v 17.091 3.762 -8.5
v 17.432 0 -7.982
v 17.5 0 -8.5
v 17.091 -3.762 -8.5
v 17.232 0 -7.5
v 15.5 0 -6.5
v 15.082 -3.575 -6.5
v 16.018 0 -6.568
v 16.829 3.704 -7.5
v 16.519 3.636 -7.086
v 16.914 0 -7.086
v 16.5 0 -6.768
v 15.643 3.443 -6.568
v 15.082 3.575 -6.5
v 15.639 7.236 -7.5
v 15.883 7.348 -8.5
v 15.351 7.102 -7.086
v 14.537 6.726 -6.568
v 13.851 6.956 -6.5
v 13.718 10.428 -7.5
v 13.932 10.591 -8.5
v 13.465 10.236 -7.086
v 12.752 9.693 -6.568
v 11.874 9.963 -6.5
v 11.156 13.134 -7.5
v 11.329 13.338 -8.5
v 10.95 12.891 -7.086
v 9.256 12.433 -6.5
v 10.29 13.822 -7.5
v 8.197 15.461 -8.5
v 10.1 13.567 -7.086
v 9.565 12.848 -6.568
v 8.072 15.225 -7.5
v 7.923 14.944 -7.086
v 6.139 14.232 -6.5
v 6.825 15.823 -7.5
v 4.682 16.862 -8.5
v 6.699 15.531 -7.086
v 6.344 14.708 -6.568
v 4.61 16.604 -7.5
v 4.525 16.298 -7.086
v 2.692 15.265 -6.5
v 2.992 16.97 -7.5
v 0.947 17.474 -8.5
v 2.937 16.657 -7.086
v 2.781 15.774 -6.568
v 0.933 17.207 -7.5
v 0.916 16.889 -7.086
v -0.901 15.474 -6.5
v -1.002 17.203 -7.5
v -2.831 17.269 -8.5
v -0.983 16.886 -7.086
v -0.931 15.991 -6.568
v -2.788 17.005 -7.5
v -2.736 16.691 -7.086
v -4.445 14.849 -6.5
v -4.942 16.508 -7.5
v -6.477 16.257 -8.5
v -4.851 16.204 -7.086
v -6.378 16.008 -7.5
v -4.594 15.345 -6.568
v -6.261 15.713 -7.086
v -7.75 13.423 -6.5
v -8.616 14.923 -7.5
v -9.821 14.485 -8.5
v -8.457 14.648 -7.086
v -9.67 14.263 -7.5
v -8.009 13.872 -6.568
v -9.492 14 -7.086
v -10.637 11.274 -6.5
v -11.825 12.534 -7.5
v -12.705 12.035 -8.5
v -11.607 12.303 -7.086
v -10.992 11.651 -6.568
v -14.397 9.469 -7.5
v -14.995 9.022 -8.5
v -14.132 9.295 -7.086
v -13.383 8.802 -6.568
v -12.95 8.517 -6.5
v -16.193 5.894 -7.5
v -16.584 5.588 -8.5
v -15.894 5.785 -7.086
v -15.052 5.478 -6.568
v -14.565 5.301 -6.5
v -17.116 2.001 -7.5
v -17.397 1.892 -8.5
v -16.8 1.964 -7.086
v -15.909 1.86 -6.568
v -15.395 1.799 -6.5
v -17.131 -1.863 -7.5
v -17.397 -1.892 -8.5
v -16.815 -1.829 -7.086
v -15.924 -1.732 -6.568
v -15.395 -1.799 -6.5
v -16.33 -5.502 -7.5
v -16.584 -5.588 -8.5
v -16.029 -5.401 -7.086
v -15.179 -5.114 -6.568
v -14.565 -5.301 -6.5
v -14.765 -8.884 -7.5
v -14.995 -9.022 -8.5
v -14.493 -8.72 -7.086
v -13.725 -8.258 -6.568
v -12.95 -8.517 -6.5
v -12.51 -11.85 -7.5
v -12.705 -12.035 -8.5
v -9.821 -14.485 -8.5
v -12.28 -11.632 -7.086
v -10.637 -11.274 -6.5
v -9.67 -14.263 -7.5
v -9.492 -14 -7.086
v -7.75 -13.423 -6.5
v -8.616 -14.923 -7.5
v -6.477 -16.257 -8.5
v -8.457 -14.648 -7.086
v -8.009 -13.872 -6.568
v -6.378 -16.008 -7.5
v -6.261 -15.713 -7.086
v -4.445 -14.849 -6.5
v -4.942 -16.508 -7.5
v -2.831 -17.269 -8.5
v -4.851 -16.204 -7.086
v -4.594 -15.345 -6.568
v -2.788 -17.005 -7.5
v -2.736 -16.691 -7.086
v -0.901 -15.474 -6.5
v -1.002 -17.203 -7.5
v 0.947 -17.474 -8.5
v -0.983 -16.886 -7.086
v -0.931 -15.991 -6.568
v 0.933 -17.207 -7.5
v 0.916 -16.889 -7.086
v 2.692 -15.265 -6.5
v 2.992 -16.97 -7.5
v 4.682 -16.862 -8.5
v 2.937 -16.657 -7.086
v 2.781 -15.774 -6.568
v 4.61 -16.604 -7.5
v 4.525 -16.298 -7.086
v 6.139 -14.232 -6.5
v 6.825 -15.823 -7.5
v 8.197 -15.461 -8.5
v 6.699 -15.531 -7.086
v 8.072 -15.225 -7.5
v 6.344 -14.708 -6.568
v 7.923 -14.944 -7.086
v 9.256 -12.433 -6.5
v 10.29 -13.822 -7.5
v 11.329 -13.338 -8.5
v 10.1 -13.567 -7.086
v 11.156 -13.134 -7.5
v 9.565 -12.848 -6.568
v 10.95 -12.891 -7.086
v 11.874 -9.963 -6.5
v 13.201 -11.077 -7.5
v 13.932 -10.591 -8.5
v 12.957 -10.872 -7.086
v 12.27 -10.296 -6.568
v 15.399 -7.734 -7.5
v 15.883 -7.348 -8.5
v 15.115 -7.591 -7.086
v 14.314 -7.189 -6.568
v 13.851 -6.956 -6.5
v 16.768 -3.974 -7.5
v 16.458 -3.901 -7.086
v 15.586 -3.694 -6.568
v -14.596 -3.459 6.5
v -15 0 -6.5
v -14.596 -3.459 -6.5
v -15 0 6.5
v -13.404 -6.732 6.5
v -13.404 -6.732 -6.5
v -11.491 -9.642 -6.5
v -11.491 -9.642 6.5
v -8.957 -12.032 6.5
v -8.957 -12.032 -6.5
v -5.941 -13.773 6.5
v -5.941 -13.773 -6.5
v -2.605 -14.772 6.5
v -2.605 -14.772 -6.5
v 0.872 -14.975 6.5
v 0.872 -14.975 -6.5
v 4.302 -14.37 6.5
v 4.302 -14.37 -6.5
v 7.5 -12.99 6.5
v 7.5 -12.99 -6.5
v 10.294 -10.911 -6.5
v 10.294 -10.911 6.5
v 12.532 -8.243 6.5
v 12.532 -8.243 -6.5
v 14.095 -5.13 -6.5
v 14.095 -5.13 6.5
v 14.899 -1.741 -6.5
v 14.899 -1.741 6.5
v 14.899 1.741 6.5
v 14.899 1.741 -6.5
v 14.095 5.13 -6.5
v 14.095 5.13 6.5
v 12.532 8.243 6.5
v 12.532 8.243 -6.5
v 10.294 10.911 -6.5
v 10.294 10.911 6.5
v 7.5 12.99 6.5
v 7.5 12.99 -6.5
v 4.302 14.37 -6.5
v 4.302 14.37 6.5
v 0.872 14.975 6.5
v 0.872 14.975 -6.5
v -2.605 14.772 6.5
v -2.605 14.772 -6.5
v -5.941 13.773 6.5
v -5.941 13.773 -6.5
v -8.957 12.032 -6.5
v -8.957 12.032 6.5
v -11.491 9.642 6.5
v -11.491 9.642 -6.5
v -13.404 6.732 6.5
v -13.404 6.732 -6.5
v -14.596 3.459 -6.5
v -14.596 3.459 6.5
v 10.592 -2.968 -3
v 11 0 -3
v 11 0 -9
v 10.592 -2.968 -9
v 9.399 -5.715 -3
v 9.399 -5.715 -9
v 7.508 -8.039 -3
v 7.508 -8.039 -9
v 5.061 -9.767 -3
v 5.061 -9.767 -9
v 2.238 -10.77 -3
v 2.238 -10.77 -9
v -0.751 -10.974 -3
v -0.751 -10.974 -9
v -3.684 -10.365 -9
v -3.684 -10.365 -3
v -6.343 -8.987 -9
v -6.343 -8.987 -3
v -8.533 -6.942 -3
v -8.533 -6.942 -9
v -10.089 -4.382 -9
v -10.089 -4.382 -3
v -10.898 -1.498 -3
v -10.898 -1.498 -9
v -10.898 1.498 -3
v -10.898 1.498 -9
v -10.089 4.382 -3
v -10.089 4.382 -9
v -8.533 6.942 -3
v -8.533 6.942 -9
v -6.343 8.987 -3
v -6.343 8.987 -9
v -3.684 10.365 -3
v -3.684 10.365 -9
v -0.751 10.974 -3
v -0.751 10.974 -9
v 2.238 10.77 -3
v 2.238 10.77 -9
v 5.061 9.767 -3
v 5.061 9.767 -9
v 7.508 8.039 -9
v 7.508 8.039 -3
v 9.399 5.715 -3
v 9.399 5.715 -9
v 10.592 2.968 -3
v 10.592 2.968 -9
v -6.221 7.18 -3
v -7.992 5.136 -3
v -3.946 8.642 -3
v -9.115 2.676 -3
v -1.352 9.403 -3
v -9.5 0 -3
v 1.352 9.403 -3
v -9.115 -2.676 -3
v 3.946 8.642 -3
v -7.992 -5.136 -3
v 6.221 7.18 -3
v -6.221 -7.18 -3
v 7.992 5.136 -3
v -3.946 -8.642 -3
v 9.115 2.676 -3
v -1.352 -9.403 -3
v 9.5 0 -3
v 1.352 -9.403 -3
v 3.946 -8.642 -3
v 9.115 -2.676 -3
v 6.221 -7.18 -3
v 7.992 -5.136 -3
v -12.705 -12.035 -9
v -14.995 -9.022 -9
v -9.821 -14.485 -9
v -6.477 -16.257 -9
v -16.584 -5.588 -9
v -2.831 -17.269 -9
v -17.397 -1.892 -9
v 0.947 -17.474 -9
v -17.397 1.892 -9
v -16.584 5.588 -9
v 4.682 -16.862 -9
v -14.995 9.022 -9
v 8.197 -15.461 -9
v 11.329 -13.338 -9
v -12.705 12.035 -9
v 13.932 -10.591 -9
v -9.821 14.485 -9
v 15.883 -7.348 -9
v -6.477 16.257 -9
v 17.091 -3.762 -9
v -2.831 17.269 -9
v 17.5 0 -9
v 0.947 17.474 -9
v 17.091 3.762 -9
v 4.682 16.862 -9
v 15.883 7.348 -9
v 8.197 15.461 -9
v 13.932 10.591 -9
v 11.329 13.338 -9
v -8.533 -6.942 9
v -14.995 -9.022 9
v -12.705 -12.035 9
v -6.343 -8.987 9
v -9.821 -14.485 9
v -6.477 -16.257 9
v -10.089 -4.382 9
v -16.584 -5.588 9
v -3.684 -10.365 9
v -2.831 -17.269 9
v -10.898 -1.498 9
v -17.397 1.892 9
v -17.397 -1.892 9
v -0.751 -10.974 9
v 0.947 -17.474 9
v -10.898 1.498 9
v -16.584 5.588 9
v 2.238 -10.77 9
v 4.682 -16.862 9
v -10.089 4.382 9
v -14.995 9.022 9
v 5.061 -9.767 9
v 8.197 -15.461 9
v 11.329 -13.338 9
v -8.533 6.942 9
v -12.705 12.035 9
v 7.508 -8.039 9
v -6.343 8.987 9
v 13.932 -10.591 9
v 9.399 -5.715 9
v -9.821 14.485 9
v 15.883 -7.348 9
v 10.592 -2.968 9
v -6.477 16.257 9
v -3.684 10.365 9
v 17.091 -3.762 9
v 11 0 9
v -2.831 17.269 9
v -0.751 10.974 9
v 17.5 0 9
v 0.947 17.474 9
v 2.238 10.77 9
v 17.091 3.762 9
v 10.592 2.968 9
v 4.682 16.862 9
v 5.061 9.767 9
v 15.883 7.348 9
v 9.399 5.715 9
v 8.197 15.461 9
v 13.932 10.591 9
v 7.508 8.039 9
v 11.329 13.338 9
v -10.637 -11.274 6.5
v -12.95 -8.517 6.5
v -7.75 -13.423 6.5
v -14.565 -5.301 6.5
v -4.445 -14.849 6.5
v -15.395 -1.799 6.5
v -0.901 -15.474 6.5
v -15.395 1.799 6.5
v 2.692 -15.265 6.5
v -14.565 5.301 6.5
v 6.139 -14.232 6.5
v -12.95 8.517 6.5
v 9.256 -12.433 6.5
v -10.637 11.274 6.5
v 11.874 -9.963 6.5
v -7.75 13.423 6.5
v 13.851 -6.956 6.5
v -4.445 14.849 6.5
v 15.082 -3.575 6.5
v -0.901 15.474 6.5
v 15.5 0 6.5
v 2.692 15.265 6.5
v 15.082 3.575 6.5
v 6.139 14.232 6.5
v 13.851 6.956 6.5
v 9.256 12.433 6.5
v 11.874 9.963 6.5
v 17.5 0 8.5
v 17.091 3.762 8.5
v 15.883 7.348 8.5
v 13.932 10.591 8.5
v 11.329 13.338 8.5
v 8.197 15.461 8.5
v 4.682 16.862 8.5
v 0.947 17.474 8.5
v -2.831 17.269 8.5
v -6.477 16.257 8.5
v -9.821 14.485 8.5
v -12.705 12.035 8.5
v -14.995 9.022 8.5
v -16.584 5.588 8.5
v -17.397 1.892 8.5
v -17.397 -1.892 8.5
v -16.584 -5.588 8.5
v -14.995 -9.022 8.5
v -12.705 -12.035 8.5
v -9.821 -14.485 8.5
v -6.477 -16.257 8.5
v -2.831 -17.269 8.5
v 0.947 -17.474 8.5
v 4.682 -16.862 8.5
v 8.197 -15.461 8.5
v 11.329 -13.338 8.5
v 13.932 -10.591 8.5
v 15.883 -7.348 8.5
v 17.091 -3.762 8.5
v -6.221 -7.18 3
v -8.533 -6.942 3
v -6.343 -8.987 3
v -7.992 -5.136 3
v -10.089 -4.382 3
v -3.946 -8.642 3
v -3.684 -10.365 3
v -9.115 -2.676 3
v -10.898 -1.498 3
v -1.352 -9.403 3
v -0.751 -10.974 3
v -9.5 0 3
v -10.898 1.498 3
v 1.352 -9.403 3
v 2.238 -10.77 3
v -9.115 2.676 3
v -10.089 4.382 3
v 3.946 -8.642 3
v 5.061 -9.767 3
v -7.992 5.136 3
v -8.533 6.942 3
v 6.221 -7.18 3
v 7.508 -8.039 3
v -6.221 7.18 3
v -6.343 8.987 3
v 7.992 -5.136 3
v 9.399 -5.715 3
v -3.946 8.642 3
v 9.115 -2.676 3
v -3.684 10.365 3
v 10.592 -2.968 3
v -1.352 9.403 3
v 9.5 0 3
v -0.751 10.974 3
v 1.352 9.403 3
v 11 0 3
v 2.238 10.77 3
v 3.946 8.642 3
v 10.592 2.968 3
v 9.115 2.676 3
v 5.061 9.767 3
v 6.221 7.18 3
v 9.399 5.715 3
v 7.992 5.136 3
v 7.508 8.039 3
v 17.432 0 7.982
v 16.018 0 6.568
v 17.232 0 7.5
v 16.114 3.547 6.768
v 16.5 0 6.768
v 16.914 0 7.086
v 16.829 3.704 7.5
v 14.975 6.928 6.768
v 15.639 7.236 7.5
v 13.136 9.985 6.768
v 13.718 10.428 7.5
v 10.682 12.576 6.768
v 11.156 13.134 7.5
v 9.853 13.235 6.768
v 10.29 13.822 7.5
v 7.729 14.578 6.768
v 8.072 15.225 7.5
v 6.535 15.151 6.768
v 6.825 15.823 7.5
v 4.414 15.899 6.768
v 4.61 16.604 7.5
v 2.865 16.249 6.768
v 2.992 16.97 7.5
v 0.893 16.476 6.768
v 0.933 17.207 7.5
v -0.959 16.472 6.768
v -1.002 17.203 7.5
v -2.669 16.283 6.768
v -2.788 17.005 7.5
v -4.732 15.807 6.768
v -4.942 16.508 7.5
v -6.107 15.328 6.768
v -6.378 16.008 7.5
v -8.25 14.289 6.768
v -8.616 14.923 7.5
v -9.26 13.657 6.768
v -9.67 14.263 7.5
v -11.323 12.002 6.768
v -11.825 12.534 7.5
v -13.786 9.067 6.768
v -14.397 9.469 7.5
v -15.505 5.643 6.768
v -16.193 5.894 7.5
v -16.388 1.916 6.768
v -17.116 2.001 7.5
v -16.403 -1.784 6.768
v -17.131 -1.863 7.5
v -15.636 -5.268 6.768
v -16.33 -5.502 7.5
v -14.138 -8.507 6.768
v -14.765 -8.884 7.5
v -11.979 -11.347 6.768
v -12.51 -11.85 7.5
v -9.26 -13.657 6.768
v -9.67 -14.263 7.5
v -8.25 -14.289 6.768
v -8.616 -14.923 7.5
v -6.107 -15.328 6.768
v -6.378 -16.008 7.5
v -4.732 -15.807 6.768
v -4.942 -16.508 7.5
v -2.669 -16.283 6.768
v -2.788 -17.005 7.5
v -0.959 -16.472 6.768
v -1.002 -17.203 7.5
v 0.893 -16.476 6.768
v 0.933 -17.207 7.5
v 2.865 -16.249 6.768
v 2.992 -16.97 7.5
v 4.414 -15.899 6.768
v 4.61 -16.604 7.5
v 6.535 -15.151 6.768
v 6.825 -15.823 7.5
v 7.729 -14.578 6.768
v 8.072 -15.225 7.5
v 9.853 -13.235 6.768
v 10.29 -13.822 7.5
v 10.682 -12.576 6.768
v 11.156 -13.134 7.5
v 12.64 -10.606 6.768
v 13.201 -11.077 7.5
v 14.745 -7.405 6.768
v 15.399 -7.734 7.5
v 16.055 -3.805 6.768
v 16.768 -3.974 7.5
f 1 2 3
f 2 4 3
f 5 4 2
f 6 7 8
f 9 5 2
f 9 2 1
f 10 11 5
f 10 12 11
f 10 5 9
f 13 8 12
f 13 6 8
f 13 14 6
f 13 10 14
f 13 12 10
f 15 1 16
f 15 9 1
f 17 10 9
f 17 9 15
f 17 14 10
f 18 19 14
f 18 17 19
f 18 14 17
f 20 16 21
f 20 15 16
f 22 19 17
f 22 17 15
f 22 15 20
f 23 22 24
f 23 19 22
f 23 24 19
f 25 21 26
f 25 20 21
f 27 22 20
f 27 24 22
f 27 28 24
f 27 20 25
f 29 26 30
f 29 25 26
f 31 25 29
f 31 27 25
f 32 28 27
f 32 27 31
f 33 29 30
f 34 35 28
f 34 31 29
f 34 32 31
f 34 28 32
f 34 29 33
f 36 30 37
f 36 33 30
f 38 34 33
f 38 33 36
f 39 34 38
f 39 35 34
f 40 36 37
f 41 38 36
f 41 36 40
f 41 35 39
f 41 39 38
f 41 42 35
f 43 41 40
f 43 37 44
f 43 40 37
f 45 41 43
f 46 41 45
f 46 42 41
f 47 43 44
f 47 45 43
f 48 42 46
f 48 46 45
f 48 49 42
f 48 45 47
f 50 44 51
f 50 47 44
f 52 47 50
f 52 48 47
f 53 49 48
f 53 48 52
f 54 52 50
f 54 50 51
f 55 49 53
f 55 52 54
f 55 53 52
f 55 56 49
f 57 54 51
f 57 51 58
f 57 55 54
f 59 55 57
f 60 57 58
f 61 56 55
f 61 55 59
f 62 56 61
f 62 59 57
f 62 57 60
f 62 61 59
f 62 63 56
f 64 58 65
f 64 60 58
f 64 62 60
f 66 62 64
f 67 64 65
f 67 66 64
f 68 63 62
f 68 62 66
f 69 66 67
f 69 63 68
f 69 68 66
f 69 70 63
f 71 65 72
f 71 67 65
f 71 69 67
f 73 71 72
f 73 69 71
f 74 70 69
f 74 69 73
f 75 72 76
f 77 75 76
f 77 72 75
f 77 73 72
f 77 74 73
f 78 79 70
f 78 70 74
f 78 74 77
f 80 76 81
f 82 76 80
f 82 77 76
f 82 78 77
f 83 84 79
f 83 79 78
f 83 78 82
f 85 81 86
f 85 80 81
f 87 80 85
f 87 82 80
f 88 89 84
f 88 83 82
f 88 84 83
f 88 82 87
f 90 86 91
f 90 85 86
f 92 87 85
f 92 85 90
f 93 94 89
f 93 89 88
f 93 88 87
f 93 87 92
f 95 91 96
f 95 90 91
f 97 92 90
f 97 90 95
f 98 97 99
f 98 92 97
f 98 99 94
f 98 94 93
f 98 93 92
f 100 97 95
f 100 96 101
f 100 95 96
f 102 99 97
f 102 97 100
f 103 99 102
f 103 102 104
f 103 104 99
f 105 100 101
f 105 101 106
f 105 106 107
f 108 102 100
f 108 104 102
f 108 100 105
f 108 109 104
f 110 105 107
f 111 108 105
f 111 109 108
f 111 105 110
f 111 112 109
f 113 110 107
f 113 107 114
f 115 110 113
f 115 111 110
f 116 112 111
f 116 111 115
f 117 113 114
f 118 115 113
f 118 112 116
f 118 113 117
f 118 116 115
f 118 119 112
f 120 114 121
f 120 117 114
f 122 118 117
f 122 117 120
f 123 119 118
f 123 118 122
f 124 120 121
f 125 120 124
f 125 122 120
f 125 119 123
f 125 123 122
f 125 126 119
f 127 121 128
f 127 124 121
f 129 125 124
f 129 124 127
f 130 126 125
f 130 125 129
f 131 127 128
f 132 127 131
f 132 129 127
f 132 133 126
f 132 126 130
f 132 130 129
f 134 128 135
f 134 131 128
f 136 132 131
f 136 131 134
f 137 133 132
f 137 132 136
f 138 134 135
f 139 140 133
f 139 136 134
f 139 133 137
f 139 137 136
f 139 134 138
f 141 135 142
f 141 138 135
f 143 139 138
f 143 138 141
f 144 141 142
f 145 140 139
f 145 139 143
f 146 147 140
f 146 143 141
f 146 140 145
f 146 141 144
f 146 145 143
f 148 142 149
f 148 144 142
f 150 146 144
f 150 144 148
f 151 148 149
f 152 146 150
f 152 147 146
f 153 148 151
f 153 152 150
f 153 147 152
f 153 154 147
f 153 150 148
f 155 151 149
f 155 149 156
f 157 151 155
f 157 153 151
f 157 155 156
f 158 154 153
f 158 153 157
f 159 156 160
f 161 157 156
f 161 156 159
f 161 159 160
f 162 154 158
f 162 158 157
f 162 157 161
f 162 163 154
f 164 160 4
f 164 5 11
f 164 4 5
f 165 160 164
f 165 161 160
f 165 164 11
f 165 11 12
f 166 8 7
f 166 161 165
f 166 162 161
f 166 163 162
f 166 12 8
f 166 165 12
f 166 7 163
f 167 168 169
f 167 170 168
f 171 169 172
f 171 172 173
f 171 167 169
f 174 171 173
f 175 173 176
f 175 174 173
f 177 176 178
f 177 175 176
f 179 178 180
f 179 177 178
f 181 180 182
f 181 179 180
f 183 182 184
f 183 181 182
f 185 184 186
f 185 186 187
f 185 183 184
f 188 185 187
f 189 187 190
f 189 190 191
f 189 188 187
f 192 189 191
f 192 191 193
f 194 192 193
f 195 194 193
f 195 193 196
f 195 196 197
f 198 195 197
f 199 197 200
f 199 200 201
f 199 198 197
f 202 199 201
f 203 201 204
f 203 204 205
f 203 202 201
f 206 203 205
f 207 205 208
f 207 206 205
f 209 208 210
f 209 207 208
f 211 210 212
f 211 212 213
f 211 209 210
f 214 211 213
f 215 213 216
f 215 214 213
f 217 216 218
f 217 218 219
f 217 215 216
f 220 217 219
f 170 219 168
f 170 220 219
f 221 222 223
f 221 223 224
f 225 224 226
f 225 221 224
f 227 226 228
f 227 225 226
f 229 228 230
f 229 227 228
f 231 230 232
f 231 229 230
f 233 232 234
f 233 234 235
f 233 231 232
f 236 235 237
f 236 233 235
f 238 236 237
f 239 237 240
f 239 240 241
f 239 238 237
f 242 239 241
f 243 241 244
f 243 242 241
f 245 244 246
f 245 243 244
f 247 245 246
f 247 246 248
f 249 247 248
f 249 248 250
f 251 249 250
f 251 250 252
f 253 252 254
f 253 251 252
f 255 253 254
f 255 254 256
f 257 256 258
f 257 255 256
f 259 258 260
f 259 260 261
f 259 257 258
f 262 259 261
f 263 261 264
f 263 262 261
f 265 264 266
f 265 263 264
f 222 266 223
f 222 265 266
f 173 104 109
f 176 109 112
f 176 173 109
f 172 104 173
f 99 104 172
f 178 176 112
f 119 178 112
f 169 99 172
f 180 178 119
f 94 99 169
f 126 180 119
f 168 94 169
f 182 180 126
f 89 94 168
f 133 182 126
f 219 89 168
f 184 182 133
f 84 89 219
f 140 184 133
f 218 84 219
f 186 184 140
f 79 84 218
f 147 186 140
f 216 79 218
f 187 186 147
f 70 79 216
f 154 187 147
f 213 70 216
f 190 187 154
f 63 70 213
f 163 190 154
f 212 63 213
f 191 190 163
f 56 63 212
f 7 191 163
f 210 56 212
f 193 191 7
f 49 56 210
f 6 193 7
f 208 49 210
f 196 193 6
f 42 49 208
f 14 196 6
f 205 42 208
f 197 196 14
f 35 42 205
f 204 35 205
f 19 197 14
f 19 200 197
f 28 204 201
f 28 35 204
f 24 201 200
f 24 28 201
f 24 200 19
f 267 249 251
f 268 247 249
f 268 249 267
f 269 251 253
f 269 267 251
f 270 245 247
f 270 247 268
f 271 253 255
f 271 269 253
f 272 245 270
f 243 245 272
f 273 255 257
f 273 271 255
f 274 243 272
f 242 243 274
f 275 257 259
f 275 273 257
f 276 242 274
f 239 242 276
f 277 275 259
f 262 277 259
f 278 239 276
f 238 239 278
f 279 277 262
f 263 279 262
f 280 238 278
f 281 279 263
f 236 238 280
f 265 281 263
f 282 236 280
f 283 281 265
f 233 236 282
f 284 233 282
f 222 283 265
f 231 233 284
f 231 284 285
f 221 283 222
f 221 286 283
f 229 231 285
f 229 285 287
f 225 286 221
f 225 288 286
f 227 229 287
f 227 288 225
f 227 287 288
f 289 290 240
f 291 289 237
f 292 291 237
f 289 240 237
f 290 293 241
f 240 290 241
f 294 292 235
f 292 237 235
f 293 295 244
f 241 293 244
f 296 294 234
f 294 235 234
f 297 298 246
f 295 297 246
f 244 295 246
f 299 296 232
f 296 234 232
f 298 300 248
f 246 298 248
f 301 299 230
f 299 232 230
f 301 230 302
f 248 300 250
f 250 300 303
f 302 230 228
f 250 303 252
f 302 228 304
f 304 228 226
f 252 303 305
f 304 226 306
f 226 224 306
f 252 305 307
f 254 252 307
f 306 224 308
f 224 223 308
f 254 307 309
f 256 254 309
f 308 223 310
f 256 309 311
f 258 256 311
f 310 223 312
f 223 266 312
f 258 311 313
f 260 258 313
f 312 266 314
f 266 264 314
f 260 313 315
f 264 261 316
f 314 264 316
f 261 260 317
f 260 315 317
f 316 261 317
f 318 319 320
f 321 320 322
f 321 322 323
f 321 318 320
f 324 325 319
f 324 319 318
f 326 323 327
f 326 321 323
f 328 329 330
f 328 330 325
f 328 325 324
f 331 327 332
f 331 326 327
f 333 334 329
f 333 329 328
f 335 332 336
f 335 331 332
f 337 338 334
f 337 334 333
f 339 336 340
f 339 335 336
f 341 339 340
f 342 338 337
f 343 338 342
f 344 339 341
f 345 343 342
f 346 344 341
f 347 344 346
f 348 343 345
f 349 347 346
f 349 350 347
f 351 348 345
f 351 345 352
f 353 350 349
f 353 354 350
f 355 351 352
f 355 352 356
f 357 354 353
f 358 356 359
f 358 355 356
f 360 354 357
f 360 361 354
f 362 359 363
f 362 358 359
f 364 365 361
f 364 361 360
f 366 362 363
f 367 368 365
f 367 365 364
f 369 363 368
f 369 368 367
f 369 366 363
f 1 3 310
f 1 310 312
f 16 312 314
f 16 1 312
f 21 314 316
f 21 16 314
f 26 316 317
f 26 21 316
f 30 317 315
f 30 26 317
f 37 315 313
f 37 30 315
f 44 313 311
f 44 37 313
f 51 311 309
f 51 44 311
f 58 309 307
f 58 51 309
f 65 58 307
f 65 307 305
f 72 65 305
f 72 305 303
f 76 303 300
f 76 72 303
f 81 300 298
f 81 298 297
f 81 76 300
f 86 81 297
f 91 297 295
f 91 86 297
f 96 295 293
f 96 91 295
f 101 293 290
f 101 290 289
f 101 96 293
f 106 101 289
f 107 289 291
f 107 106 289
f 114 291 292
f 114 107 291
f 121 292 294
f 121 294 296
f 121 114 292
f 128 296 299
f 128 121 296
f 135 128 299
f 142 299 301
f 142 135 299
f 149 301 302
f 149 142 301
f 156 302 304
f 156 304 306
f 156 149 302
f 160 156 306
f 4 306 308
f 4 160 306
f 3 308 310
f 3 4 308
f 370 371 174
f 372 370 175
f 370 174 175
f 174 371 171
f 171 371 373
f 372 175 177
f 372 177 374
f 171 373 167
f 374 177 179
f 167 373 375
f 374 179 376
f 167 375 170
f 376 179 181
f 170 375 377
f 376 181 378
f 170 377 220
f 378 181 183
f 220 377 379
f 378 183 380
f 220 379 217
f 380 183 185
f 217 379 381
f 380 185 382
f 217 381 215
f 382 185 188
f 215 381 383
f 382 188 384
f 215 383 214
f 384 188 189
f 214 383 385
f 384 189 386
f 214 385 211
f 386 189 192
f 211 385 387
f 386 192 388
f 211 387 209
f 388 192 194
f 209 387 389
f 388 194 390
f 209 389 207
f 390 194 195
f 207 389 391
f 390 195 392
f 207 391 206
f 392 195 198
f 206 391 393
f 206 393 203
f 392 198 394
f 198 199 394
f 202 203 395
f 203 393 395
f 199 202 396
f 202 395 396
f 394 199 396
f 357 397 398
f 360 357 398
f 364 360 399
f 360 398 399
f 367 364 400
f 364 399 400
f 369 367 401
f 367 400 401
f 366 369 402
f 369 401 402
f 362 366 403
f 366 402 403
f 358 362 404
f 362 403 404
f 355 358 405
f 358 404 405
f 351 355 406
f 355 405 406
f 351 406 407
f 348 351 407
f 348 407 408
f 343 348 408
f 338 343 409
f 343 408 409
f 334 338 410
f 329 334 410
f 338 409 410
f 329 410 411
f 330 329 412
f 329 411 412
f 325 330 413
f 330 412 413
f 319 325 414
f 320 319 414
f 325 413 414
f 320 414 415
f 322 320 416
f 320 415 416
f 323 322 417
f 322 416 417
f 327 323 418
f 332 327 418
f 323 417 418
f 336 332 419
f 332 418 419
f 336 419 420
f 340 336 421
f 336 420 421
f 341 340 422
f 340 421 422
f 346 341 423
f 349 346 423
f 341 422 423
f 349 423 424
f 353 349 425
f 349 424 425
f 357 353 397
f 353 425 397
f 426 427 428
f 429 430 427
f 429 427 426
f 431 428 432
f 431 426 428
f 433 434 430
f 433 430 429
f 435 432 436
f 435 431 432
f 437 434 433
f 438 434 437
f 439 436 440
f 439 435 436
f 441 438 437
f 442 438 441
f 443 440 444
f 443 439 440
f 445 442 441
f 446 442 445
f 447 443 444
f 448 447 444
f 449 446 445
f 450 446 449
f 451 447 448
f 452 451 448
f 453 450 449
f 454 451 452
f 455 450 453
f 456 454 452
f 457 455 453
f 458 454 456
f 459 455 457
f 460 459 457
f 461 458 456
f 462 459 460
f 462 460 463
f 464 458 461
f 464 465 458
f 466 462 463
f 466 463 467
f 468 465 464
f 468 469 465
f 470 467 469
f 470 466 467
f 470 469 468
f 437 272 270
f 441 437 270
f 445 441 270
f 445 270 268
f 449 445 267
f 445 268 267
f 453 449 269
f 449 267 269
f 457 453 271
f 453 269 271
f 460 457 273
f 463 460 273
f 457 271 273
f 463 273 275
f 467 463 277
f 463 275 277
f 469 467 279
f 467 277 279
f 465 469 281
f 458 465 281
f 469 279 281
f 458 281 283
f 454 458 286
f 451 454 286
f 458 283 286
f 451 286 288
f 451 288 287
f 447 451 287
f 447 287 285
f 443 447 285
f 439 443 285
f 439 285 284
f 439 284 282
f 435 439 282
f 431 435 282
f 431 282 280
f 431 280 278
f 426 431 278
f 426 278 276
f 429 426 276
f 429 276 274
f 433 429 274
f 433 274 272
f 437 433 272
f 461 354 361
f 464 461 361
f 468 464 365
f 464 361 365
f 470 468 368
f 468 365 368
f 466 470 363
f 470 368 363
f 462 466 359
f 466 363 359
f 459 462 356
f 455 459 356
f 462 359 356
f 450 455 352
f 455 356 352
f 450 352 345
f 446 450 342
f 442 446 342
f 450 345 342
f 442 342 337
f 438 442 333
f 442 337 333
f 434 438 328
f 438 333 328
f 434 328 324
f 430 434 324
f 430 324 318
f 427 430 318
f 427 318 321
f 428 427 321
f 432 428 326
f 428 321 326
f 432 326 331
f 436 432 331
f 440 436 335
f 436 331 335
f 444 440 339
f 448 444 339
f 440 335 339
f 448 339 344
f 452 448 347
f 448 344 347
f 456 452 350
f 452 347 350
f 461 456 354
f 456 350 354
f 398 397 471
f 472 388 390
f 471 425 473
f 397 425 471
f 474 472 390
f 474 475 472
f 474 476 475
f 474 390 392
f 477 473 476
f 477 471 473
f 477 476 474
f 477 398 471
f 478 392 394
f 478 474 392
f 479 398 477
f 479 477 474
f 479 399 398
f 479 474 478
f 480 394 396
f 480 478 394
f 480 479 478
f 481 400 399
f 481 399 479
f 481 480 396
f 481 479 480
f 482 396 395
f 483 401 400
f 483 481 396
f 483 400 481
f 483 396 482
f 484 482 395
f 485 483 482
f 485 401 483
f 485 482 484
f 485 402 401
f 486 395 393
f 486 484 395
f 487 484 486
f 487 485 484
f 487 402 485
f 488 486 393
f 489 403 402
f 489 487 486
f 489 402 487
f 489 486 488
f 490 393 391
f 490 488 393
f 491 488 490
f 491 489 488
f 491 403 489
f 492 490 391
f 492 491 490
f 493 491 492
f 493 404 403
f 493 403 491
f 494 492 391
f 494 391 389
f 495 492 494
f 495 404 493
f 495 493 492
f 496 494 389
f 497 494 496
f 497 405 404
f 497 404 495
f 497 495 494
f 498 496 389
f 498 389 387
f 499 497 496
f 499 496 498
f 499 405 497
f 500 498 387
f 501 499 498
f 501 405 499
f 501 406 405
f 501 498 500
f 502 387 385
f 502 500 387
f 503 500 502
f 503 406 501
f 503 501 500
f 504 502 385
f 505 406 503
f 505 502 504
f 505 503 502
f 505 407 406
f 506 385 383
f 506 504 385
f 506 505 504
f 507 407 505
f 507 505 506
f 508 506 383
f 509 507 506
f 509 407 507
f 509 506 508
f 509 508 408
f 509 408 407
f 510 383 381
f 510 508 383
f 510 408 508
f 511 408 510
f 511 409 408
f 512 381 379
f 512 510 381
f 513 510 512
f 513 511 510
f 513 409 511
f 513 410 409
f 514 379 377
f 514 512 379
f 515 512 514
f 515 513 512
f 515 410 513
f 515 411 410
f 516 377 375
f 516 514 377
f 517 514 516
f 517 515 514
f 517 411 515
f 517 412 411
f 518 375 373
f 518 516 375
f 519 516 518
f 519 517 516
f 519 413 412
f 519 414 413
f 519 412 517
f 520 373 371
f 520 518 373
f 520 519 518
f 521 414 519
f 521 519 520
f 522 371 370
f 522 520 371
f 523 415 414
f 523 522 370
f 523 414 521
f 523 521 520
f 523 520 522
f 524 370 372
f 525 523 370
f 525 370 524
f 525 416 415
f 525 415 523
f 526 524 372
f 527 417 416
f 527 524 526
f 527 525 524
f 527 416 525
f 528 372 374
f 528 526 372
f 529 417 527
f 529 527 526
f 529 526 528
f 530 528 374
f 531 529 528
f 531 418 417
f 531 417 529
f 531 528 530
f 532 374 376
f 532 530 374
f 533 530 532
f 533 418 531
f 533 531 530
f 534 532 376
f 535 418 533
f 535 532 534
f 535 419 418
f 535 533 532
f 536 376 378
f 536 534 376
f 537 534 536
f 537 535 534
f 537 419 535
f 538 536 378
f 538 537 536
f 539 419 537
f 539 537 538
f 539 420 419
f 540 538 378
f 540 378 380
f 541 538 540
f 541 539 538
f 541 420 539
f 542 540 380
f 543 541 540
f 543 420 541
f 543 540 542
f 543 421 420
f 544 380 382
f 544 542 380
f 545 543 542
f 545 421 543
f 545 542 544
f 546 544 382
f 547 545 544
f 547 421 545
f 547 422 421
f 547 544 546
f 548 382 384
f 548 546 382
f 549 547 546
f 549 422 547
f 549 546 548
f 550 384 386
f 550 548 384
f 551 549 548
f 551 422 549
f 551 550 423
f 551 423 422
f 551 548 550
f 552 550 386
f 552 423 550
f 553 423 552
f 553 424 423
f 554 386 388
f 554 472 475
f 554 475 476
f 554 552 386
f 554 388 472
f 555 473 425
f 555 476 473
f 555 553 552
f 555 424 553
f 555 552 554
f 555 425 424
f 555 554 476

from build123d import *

# Parameters (mm, degrees)
SKETCH_1_R          = 15
EXTRUDE_1_DEPTH     = 6.5
SKETCH_2_R          = 17.5
EXTRUDE_2_DEPTH     = 2.5
SKETCH_3_R          = 11
CUT_EXTRUDE_1_DEPTH = 6
CUT_EXTRUDE_START   = -6
SKETCH_4_R          = 11
CUT_EXTRUDE_2_DEPTH = 6
SKETCH_5_R          = 9.5
CUT_EXTRUDE_3_DEPTH = 28.504545079
FILLET_1_R          = 2


with BuildPart() as part:
    # 草图1 → 拉伸1 (new, symmetric)
    with BuildSketch(Plane.XY):
        with Locations(Location((0, 0, 0), (0, 0, 180))):
            Circle(SKETCH_1_R)
    extrude(amount=EXTRUDE_1_DEPTH, both=True)

    # 草图2 → 拉伸2 (add)
    with BuildSketch(Plane.XY.offset(6.5)):
        Circle(SKETCH_2_R)
    extrude_2 = extrude(amount=EXTRUDE_2_DEPTH)

    # 镜向1: 拉伸2 across plane
    add(extrude_2.mirror(Plane.XY))

    # 草图3 → 切除-拉伸1 (cut)
    with BuildSketch(Plane.XY.offset(9)):
        Circle(SKETCH_3_R)
    extrude(amount=-CUT_EXTRUDE_1_DEPTH, mode=Mode.SUBTRACT)

    # 草图4 → 切除-拉伸2 (cut)
    with BuildSketch(Plane(origin=(0, 0, -9), x_dir=(-1, 0, 0), z_dir=(0, 0, -1)).offset(CUT_EXTRUDE_START)):
        with Locations(Location((0, 0, 0), (0, 0, 180))):
            Circle(SKETCH_4_R)
    extrude(amount=CUT_EXTRUDE_2_DEPTH, mode=Mode.SUBTRACT)

    # 草图5 → 切除-拉伸3 (cut, through all)
    with BuildSketch(Plane(origin=(0, 0, -3), x_dir=(-1, 0, 0), z_dir=(0, 0, -1))):
        Circle(SKETCH_5_R)
    extrude(amount=-CUT_EXTRUDE_3_DEPTH, mode=Mode.SUBTRACT)

    # 圆角1
    fillet_1_edges = [part.edges().sort_by_distance(p)[0] for p in [
        (-17.5, 0, 6.5),
        (-17.5, 0, -6.5),
    ]]
    fillet(fillet_1_edges, radius=FILLET_1_R)


solid = part.part
